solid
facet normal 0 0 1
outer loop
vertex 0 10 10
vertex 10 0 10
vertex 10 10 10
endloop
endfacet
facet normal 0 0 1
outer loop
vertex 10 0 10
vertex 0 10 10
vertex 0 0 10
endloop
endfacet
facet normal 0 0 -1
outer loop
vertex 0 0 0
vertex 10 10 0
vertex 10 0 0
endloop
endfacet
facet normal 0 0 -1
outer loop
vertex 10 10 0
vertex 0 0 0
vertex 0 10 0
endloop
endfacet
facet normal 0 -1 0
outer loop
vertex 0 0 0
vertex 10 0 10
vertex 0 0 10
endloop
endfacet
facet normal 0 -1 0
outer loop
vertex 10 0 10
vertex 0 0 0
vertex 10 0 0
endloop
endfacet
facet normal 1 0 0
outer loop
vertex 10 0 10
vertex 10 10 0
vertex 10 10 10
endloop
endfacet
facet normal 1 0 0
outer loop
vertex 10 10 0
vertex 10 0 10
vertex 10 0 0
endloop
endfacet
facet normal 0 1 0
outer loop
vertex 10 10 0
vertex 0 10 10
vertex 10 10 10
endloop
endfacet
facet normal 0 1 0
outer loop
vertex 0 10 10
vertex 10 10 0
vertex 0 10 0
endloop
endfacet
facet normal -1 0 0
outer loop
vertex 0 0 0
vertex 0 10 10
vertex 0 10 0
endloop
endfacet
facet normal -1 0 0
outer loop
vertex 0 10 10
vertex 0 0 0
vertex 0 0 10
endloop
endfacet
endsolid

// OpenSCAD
// mantis doctor OpenSCAD hardwarnings fixture
cube([10, 10, 10]);
